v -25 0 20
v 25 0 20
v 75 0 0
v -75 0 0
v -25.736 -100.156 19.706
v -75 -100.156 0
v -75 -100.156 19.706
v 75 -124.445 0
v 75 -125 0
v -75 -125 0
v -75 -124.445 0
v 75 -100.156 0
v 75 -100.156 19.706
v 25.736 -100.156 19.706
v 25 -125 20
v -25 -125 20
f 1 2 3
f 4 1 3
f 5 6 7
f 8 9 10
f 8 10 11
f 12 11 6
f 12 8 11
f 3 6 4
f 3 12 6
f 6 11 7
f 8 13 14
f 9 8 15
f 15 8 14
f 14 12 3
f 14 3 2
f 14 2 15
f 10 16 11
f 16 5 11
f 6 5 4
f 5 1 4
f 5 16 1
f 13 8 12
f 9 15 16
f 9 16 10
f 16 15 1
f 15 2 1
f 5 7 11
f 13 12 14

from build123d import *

# Parameters (mm, degrees)
F1_DEPTH = 100
F2_DEPTH = 25
F4_DEPTH = 75
F5_DEPTH = 75


with BuildPart() as f1:
    # F0 (on Front) → F1 (new body)
    with BuildSketch(Plane.XZ):
        Polygon((75, 0), (25, 20), (-25, 20), (-75, 0), align=None)
    extrude(amount=F1_DEPTH)

    # F1_face (on face) → F2 (join)
    with BuildSketch(Plane(origin=(0, -100, 8.333333), x_dir=(1, 0, 0), z_dir=(0, -1, 0))):
        Polygon((75, -8.333333), (25, 11.666667), (-25, 11.666667), (-75, -8.333333), align=None)
    extrude(amount=F2_DEPTH)

    # F3 (on Right) → F4 (join)
    with BuildSketch(Plane.YZ):
        Polygon((-124.444783, 0), (-100.156426, 0), (-100.156426, 19.705653), align=None)
    extrude(amount=F4_DEPTH)

    # F3 (on Right) → F5 (join)
    with BuildSketch(Plane.YZ):
        Polygon((-124.444783, 0), (-100.156426, 0), (-100.156426, 19.705653), align=None)
    extrude(amount=-F5_DEPTH)


solid = f1.part
